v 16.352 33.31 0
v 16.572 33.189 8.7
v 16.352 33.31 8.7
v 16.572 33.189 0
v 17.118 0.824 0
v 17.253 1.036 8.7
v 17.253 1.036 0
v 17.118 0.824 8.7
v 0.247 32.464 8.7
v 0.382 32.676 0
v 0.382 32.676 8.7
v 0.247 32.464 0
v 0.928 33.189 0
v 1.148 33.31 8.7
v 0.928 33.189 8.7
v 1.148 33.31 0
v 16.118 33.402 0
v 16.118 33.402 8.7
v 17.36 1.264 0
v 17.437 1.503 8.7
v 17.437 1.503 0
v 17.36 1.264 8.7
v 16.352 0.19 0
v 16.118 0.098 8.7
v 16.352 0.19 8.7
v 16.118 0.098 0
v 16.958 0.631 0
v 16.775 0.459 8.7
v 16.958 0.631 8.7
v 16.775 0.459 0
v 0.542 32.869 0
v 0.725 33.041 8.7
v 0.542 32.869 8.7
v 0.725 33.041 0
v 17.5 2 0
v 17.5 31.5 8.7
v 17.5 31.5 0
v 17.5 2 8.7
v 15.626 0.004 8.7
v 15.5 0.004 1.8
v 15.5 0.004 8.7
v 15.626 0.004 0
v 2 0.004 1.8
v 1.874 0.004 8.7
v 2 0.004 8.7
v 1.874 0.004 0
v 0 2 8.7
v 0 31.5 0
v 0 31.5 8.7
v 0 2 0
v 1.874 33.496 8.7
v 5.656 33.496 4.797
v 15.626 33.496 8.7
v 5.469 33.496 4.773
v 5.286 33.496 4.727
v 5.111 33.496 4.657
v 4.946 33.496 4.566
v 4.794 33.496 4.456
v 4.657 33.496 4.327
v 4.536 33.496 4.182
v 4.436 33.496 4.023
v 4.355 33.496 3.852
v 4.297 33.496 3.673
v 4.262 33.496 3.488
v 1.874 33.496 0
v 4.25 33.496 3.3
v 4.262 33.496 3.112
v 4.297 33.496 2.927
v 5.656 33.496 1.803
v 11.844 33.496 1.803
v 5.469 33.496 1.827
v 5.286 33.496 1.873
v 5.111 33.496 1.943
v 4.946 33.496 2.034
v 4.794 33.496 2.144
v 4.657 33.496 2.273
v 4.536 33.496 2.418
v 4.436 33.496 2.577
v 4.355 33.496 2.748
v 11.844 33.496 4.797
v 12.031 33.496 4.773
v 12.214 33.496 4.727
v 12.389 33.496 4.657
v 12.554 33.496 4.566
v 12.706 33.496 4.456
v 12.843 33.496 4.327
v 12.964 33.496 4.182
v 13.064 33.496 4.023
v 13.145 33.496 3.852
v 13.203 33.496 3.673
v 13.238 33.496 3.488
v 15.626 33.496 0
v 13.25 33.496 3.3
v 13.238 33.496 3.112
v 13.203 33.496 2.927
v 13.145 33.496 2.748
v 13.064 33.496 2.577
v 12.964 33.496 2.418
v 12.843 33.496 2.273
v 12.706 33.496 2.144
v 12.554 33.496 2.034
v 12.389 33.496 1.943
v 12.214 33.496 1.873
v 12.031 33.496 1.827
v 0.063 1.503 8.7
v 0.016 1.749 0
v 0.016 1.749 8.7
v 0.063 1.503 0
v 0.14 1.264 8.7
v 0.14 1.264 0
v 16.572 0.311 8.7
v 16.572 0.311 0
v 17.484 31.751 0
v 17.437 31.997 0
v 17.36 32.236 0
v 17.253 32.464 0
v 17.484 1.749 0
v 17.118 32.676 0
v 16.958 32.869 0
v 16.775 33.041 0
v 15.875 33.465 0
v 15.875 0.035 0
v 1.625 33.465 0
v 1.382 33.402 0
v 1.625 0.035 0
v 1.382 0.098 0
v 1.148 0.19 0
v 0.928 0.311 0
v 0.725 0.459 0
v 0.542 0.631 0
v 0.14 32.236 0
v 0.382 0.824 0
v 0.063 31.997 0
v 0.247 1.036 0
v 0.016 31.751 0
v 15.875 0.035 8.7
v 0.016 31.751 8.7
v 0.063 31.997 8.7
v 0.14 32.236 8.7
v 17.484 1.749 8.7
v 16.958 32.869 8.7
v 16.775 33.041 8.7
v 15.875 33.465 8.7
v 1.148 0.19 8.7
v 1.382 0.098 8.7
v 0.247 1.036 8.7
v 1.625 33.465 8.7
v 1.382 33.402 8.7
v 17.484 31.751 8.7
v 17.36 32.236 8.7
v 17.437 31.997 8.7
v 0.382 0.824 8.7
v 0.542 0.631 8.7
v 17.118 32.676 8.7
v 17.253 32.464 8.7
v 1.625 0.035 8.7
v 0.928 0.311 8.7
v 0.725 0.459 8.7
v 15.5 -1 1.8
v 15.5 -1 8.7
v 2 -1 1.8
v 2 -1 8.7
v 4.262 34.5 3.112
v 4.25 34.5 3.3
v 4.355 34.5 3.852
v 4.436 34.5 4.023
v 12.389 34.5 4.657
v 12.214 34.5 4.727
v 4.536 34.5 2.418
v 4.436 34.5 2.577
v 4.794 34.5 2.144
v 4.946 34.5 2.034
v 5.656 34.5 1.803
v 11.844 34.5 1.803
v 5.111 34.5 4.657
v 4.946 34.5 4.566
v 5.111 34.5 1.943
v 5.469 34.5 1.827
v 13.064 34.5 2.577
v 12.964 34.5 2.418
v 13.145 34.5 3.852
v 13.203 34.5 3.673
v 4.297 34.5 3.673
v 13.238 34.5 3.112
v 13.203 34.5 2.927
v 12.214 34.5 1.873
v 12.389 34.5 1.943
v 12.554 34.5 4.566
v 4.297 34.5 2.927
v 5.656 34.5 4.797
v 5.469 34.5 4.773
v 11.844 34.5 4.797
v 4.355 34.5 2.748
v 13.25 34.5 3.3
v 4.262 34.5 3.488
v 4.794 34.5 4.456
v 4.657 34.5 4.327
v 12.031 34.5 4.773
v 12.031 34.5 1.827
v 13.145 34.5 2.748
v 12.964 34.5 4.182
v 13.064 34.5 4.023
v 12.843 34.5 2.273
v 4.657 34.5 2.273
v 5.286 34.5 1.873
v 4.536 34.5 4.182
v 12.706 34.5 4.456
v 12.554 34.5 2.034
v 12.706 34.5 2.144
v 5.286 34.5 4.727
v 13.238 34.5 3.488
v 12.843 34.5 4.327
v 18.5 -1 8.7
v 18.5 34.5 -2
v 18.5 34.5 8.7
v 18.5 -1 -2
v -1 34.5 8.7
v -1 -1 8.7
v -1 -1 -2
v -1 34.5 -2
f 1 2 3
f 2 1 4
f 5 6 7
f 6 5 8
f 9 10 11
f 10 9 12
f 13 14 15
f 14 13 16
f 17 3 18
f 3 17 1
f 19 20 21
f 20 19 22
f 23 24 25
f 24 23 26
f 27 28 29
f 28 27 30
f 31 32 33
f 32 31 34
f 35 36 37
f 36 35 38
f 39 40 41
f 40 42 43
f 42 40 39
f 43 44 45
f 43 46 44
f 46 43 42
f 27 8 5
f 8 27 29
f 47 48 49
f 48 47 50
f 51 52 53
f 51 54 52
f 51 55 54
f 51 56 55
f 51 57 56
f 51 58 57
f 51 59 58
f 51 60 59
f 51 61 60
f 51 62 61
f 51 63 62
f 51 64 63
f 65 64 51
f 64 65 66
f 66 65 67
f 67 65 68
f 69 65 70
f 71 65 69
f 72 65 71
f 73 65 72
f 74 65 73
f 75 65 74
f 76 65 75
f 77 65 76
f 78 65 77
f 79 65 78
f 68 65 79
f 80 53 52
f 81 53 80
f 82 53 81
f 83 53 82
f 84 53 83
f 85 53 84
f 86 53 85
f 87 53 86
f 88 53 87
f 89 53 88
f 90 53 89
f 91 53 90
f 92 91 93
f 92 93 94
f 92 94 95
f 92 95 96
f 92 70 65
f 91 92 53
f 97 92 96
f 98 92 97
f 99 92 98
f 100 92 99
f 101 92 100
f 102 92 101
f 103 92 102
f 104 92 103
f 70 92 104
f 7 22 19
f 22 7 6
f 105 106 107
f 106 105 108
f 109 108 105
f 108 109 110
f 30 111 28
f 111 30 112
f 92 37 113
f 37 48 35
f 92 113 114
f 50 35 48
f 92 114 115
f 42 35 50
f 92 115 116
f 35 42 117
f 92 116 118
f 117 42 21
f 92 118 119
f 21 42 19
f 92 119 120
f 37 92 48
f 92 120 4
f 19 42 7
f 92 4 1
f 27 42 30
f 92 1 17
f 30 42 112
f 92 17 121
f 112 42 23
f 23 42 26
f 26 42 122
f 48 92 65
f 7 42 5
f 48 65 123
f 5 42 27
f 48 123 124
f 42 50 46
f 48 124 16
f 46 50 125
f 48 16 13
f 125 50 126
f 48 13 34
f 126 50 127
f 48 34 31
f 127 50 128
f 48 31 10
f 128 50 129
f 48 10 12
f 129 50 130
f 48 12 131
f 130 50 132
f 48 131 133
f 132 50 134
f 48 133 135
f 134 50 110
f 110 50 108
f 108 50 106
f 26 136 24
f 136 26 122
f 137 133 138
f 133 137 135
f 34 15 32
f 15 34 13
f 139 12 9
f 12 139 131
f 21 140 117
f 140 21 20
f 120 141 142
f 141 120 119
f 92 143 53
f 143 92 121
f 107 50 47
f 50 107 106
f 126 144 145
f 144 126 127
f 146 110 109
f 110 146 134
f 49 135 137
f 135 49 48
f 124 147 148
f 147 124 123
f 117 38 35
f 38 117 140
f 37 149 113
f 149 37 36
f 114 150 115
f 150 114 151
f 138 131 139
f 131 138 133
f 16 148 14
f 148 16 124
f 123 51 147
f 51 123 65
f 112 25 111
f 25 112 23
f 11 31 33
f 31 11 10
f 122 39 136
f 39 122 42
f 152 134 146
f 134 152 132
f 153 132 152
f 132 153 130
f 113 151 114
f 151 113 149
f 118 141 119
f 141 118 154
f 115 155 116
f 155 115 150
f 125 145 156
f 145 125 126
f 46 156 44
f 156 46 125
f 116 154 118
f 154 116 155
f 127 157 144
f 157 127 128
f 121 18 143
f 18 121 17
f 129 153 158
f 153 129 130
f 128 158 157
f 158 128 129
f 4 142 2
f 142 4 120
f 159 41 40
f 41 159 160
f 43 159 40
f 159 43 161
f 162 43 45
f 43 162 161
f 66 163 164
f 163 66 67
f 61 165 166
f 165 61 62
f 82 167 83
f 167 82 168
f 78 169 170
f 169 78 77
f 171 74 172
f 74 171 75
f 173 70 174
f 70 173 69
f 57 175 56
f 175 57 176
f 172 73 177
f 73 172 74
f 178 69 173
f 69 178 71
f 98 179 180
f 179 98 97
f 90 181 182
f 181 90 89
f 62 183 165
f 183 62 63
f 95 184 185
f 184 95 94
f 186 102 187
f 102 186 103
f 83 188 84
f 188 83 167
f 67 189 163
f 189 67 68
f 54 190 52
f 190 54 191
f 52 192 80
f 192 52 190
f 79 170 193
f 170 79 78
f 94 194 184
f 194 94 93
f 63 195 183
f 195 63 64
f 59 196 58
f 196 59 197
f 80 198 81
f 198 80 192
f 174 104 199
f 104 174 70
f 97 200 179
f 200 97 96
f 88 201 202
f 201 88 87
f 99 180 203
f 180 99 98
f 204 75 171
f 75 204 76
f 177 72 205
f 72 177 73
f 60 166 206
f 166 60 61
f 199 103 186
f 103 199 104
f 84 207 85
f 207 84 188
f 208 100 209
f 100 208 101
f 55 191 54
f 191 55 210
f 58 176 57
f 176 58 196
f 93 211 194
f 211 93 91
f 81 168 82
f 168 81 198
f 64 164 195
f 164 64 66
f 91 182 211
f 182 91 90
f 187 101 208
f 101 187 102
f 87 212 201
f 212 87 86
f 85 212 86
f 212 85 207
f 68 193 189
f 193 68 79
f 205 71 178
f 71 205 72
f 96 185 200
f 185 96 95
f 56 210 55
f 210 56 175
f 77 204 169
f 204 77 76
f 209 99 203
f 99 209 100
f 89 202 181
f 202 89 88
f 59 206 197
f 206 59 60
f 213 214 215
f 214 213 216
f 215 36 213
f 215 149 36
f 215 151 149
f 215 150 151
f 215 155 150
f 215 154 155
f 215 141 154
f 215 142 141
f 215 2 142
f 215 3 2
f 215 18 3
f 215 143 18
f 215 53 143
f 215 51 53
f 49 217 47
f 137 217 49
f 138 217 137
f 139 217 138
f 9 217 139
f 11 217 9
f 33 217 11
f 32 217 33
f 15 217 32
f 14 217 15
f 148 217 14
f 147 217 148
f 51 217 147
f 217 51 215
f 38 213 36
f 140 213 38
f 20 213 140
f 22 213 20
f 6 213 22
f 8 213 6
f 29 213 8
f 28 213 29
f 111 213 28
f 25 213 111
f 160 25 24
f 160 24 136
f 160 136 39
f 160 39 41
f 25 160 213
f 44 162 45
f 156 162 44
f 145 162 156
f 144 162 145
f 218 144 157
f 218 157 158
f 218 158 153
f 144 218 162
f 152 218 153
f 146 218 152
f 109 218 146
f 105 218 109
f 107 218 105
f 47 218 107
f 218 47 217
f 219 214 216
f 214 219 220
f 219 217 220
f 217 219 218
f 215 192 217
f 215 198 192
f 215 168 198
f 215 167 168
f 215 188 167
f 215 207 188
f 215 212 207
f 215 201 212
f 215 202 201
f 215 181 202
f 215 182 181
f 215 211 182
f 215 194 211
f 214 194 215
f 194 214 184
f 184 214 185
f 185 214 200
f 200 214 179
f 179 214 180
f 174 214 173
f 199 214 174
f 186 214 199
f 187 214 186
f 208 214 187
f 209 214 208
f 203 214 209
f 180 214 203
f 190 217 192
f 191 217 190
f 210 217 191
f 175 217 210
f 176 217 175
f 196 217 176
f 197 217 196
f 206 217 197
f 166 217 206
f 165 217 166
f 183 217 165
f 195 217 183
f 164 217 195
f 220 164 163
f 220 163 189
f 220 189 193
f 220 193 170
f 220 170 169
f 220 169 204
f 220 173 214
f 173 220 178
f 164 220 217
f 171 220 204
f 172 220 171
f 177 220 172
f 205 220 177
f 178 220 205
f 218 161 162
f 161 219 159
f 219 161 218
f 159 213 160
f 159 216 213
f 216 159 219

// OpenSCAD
$fn=50;

box();
//translate([0,0,10])lid();

module box(){
difference(){
    translate([-1,-1,-2])cube([17.5+2,33.5+2,10.7]);
    pcb(10);
}
}


module lid(){
difference(){
union(){
translate([-1,-1,1])
{cube([17.5+2,33.5+2,1]);
translate([1,1,-0.7])hull(){
    translate([2,2,0])cylinder(d=4,h=1);
    translate([17.5-2,2,0])cylinder(d=4,h=1);
    translate([17.5-2,33.5-2,0])cylinder(d=4,h=1);
    translate([2,33.5-2,0])cylinder(d=4,h=1);
}
}
}
translate([2,-1.01,0])cube([13.5,10,1]);
translate([4.75,10,0])cube([8,14,10]);
}
}


module pcb(he){
hull(){
    translate([2,2,0])cylinder(d=4,h=he);
    translate([17.5-2,2,0])cylinder(d=4,h=he);
    translate([17.5-2,33.5-2,0])cylinder(d=4,h=he);
    translate([2,33.5-2,0])cylinder(d=4,h=he);
}



translate([2,-1.01,1.8])cube([13.5,10,7]);
    

translate([8.5/2,33.5-5.5,1.8+1.5])rotate([-90,0,0])hull(){
    translate([1.5,0,0])cylinder(d=3,h=7);
    translate([9-1.5,0,0])cylinder(d=3,h=7);
}
    }
